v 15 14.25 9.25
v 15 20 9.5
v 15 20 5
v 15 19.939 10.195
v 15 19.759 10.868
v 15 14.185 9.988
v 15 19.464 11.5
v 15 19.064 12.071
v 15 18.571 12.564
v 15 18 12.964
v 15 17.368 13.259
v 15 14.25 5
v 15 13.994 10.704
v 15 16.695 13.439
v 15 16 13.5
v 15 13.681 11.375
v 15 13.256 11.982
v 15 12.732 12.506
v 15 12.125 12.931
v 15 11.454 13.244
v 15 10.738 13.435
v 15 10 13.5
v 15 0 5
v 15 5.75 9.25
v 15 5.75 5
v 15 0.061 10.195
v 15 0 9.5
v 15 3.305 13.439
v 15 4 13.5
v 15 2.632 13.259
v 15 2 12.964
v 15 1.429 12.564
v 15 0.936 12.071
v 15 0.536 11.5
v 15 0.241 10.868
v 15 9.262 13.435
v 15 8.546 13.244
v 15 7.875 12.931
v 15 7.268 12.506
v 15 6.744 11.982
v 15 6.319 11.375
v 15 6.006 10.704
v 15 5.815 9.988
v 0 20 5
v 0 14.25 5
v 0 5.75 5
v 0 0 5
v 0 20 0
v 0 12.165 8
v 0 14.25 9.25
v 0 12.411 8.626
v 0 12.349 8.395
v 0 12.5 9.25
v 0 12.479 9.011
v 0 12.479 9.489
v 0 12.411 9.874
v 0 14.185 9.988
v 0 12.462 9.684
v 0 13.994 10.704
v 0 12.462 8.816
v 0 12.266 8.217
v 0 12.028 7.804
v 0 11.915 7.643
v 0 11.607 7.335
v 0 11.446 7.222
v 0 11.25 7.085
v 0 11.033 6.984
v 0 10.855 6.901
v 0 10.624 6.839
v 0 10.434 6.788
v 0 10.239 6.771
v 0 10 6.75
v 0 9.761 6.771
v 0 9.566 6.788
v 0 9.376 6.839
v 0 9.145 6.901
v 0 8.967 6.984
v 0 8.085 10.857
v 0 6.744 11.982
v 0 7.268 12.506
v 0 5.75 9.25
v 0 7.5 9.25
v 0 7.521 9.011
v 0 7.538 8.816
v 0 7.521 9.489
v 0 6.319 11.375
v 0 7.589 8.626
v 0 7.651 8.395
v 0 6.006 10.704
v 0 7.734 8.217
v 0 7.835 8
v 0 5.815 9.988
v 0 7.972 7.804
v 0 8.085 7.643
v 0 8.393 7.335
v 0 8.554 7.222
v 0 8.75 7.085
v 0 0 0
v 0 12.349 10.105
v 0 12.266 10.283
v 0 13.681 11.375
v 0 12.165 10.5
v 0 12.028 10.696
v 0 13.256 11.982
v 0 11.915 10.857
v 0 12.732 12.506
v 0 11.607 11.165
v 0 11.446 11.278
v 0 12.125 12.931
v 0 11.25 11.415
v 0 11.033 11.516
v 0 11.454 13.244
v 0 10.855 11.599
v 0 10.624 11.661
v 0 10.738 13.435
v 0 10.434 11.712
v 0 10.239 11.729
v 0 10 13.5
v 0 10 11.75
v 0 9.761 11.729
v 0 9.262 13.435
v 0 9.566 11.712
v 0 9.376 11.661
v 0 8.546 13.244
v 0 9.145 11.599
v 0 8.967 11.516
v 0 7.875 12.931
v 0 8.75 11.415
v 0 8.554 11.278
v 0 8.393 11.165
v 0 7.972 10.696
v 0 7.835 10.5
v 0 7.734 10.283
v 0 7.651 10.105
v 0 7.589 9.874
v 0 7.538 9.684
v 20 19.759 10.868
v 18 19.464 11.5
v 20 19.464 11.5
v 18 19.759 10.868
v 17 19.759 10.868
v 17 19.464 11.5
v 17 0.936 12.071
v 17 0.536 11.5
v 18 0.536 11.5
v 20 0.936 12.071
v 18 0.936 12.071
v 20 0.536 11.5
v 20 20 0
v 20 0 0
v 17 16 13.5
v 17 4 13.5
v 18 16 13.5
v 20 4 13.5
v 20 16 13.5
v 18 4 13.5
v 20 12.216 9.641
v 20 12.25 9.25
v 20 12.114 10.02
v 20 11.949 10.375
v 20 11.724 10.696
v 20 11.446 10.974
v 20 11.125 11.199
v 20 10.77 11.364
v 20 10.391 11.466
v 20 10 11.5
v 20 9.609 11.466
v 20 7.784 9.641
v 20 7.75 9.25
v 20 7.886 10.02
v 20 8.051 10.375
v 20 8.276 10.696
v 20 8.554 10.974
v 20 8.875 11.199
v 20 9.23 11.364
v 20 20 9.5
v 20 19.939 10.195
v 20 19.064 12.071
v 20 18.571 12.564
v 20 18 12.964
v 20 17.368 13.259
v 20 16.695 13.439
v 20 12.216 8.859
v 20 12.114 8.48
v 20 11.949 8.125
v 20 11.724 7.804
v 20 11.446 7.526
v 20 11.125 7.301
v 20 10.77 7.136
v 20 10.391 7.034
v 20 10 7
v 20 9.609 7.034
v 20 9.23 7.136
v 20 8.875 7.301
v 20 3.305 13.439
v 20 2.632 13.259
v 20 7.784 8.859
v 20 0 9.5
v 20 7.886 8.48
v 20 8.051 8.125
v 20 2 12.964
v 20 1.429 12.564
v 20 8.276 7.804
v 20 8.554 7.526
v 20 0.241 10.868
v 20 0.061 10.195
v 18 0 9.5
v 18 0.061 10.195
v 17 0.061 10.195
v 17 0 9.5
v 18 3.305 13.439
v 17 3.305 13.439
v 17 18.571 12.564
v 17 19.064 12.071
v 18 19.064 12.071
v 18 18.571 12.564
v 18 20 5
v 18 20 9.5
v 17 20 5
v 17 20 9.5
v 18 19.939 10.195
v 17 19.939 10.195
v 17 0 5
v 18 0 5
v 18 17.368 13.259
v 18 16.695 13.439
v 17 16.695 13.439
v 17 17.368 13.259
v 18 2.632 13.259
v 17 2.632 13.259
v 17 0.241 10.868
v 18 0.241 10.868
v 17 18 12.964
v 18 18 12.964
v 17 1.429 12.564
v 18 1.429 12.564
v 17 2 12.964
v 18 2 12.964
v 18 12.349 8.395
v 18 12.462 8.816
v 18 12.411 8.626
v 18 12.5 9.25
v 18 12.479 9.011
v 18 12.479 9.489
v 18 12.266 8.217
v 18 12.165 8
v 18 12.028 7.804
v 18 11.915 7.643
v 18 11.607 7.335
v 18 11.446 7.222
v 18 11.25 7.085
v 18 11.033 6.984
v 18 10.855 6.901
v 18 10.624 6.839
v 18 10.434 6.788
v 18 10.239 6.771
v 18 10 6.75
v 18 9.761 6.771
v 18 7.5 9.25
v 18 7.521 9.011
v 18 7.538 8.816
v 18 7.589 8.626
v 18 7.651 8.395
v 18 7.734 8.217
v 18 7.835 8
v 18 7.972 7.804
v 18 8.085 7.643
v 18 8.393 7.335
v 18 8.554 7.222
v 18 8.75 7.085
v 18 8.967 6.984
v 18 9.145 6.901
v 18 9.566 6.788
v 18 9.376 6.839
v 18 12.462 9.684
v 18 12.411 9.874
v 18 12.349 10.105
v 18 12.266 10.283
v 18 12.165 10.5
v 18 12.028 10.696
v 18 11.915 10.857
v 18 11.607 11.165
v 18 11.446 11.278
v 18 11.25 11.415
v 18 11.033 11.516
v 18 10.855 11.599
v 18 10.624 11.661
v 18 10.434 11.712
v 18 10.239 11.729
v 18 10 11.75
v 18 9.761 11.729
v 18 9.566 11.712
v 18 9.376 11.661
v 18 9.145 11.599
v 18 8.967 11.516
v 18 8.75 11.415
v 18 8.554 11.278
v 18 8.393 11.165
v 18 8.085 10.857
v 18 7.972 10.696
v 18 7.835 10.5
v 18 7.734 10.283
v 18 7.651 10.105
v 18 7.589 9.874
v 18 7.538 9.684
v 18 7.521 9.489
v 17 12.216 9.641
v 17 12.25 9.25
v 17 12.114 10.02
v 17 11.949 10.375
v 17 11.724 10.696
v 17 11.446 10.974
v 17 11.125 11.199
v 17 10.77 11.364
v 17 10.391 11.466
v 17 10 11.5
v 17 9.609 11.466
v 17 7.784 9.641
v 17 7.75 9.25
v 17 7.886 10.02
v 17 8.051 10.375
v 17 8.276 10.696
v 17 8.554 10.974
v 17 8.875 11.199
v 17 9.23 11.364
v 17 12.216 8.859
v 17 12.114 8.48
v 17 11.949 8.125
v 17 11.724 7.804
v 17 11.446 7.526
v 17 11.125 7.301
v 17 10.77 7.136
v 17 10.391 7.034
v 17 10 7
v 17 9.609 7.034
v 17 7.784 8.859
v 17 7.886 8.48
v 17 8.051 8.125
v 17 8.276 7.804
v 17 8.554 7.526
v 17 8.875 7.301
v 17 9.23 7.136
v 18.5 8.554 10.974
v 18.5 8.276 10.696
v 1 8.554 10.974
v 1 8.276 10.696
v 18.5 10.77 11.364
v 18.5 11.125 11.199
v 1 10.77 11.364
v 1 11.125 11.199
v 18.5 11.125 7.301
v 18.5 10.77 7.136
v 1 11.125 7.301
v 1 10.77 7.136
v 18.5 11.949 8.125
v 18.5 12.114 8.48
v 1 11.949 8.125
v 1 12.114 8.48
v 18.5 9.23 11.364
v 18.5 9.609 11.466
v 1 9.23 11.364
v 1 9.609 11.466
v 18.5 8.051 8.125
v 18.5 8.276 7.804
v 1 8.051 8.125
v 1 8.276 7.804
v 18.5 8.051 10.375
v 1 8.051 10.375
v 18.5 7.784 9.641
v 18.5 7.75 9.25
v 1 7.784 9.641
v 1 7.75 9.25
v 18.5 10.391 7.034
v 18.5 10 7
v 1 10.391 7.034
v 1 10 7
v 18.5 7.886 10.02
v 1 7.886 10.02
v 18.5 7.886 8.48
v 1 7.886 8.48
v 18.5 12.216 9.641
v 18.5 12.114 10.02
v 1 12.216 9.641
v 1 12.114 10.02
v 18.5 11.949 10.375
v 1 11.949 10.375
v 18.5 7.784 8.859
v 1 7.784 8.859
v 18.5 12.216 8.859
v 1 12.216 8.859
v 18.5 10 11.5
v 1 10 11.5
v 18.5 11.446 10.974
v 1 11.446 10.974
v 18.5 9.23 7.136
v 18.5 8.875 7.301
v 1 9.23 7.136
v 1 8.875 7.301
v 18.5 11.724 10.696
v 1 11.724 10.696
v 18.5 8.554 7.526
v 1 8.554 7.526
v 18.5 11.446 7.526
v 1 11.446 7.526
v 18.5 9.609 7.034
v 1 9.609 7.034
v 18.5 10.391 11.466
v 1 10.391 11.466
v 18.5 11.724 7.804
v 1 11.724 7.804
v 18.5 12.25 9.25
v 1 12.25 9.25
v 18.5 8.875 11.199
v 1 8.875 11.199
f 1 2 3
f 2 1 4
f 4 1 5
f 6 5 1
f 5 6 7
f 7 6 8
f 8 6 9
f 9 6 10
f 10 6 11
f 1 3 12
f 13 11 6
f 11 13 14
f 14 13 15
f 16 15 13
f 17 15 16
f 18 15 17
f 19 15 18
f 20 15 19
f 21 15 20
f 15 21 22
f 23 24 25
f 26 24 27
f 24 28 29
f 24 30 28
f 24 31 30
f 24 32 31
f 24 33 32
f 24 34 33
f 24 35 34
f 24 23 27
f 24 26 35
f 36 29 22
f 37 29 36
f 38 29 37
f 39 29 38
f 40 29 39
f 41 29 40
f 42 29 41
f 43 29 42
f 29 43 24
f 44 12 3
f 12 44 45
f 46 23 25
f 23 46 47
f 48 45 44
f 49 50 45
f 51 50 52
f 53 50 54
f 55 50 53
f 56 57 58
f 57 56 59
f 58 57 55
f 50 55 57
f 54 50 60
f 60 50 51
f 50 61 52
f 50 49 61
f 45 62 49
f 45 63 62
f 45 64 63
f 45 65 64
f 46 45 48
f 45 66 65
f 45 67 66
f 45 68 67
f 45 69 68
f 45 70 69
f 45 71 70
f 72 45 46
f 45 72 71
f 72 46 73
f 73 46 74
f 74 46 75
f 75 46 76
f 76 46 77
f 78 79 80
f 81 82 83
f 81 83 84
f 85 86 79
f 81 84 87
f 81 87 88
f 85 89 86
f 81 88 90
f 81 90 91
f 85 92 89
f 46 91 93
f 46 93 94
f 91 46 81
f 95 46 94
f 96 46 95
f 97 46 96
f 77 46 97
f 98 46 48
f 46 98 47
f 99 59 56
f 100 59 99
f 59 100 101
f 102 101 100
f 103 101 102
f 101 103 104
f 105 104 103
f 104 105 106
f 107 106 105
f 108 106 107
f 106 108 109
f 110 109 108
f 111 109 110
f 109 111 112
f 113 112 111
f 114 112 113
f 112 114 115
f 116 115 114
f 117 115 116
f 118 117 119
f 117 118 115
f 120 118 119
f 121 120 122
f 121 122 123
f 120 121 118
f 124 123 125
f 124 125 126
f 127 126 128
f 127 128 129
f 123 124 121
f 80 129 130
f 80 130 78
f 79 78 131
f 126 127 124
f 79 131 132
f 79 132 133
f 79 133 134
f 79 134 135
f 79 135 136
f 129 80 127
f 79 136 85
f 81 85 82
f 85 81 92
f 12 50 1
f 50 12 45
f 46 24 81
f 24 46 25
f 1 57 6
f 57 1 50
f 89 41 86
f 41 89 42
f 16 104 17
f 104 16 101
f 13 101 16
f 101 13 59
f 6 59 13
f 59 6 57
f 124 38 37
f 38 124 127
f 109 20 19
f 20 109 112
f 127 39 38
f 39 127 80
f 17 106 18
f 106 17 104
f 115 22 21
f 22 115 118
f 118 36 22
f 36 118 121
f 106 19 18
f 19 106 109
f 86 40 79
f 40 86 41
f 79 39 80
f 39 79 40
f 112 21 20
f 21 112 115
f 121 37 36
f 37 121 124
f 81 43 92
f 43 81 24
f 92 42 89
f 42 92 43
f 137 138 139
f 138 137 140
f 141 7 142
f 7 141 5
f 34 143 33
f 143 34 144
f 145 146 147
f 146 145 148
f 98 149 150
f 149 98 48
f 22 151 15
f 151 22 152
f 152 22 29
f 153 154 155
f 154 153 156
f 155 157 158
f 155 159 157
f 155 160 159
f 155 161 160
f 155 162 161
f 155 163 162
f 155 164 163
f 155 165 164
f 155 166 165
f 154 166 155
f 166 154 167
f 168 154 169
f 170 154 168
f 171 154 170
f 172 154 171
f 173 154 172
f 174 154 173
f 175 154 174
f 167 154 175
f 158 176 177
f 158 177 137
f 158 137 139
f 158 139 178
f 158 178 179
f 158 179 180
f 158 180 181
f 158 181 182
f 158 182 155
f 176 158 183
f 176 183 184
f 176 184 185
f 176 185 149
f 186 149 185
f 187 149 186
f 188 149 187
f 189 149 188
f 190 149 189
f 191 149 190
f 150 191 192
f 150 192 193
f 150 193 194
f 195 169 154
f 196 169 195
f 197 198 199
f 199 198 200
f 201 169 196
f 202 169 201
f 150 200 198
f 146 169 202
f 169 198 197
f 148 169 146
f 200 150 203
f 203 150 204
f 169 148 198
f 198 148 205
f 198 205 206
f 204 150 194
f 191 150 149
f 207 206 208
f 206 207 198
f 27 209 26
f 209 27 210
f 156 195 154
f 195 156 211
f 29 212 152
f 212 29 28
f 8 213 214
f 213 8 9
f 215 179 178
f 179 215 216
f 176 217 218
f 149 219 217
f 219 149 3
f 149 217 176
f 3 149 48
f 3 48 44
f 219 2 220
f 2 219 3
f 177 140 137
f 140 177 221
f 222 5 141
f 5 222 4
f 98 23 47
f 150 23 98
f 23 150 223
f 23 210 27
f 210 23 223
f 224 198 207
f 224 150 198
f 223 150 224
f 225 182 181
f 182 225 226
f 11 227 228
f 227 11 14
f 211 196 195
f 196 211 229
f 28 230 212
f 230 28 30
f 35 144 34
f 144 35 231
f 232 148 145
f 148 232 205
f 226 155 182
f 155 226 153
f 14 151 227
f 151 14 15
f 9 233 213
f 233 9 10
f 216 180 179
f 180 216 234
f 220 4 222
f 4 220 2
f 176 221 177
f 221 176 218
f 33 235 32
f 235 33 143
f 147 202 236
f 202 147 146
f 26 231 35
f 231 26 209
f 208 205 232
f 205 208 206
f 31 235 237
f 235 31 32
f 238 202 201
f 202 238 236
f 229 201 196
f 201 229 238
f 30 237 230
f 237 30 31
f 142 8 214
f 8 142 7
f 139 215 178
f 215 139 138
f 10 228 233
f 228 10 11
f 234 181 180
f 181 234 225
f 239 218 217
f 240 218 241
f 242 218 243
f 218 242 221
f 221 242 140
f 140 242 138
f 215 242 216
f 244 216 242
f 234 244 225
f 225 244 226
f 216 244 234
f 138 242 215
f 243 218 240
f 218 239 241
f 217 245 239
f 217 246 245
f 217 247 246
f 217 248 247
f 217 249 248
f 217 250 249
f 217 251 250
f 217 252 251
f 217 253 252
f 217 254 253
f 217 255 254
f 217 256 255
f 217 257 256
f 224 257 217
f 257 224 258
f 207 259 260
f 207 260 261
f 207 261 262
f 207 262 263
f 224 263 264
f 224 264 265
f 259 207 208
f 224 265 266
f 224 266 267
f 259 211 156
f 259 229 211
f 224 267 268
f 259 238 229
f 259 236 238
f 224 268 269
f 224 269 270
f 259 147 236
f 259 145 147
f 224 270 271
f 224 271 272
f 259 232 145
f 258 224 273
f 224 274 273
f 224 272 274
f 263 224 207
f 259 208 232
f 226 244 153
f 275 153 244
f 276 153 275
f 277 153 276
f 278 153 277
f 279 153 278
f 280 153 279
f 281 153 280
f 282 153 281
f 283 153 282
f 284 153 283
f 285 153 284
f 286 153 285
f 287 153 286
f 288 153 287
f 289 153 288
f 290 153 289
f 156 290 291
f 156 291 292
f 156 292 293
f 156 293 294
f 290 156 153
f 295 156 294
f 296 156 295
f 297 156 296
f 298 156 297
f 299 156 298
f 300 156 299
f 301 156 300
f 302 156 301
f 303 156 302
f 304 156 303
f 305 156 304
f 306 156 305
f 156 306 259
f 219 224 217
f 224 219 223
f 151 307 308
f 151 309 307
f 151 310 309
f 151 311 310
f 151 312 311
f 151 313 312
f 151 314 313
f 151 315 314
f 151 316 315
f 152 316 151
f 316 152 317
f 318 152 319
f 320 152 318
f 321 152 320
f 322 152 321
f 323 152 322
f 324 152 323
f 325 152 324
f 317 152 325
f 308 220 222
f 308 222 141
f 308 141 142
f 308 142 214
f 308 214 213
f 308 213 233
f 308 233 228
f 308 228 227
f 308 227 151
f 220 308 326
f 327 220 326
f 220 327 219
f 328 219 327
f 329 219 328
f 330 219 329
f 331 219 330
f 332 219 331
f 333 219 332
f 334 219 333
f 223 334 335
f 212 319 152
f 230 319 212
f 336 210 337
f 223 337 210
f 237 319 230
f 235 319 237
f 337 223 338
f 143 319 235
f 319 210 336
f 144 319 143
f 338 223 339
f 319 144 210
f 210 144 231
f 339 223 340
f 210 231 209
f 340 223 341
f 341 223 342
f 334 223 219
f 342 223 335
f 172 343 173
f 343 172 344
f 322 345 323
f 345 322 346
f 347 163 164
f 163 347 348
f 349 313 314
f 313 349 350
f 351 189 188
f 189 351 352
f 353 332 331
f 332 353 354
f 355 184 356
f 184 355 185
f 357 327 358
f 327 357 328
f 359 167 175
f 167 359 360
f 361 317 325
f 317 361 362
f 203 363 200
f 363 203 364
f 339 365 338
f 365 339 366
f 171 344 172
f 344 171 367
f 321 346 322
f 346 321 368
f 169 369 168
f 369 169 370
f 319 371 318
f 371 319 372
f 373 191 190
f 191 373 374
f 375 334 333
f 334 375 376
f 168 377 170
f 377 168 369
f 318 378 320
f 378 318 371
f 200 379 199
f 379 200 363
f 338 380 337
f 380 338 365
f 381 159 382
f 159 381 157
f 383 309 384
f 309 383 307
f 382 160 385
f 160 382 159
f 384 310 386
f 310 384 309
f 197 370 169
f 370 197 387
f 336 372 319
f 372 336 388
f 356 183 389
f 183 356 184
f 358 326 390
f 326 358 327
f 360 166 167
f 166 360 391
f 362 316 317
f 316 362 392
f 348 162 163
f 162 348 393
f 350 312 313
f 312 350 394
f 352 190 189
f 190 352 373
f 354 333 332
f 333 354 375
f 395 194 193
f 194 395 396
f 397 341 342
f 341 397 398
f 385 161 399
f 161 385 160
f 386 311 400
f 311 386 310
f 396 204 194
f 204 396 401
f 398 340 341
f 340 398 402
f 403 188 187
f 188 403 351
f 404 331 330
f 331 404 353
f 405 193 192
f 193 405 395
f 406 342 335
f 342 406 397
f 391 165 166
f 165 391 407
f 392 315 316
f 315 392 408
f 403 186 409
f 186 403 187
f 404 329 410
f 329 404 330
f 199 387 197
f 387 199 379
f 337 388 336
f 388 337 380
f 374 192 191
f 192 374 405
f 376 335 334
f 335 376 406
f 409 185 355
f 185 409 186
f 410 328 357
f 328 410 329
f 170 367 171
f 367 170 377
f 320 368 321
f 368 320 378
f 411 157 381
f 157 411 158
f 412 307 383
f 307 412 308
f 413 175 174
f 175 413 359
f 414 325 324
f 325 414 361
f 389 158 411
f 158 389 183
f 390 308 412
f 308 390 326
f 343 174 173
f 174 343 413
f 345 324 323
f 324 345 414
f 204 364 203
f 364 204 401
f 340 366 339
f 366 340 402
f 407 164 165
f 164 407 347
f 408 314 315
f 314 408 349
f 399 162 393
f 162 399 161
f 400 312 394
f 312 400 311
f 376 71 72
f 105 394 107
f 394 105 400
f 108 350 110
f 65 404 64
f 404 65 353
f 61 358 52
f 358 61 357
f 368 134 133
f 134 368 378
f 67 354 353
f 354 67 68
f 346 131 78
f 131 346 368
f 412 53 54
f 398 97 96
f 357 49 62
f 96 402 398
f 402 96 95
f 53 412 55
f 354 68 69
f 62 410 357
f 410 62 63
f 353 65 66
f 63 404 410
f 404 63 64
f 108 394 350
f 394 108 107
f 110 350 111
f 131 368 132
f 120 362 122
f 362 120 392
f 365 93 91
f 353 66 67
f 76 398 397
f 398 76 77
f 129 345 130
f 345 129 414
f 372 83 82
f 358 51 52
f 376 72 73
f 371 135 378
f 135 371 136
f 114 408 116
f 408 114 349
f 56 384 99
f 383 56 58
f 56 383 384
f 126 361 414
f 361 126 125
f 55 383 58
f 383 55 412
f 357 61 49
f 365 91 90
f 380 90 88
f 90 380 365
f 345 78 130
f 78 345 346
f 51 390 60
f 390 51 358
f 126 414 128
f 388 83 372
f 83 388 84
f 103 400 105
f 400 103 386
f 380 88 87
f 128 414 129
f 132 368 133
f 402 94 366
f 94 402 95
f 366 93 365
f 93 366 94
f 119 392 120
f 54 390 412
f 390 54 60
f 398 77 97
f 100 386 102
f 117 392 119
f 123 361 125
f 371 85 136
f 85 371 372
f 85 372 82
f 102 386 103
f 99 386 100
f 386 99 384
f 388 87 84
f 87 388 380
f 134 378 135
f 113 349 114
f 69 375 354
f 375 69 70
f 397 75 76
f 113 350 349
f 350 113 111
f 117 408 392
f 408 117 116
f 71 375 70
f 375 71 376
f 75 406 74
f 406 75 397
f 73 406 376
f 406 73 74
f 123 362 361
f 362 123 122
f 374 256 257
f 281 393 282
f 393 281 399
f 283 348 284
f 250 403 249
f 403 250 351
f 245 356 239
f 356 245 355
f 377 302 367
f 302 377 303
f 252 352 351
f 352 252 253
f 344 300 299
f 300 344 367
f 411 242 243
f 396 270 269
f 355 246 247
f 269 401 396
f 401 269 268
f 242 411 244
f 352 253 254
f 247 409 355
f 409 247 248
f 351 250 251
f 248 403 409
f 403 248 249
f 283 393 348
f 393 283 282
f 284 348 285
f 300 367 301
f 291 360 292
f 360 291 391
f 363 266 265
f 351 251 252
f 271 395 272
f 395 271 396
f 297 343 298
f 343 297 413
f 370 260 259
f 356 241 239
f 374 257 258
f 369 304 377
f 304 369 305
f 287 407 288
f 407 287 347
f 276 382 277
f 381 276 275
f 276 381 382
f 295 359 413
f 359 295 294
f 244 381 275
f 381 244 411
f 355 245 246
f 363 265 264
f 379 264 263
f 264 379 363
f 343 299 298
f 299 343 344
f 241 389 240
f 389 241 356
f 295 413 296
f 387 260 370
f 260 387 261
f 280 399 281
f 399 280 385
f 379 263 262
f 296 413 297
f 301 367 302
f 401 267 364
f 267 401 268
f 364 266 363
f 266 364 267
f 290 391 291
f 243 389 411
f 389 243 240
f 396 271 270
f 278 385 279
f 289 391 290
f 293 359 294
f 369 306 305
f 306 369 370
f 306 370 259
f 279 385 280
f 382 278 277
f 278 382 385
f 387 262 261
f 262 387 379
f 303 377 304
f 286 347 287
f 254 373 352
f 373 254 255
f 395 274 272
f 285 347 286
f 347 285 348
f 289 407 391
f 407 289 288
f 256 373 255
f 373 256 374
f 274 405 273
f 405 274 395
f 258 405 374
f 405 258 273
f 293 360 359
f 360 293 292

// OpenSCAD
// Diameter of hole for PTFE tube (mm)
tube_diameter = 4.5;
// Size of slot for blade (mm)
blade_thickness = 1;
// Corner Smoothness (higher is smoother)
$fn = 36;

/* [Hidden */

wall_thickness = 2;
base_thickness = 5;
corner_radius = 4;

tube_guide_thickness = tube_diameter + (wall_thickness * 2);
blade_guide_thickness = blade_thickness + (wall_thickness * 2);
base_size = max(20, tube_guide_thickness * 2);

echo("tube guide diameter", tube_guide_thickness);
echo("blade guide diameter", blade_guide_thickness);
echo("base size", base_size);

//cube([base_size, base_size, base_thickness]);

difference()
{
    union()
    {
        cube([base_size - blade_guide_thickness, base_size, base_thickness]);
        #translate([0, (base_size - tube_guide_thickness) / 2 , base_thickness]) tube_guide();
        #translate([base_size - blade_guide_thickness, 0, 0]) blade_guide();
    }
    translate([-1, base_size /2, base_thickness + wall_thickness + (tube_diameter / 2)]) tube_hole();
}

module tube_guide()
{
    cube([base_size - blade_guide_thickness, tube_guide_thickness, tube_guide_thickness / 2]);
    translate([0, tube_guide_thickness / 2, tube_guide_thickness / 2  ]) rotate([0, 90, 0]) cylinder(d = tube_guide_thickness, h = base_size - blade_guide_thickness);
}

module tube_hole()
{
    union()
    {
    rotate([0, 90, 0]) cylinder(d = tube_diameter, h = base_size + 2);
    rotate([0, 90, 0]) cylinder(d = tube_diameter + 1, d2 = tube_diameter, h = 2);
    translate([base_size - wall_thickness + (blade_thickness / 2), 0, 0]) rotate([0, 90, 0]) cylinder(d = tube_diameter + 1, d2 = tube_diameter, h = blade_thickness);
    }
}

module blade_guide()
{
    difference()
    {
        hull()
        {
        cube([blade_guide_thickness, base_size, base_thickness]);
        translate([0, corner_radius, base_thickness + tube_guide_thickness - corner_radius]) rotate([0, 90, 0]) cylinder(r = corner_radius, h = blade_guide_thickness);
        translate([0, base_size - corner_radius, base_thickness + tube_guide_thickness - corner_radius]) rotate([0, 90, 0]) cylinder(r = corner_radius, h = blade_guide_thickness);
        }
        translate([(blade_guide_thickness - blade_thickness) / 2, -1, base_thickness]) cube([blade_thickness, base_size + 2, base_thickness + tube_guide_thickness]);
    }
}
